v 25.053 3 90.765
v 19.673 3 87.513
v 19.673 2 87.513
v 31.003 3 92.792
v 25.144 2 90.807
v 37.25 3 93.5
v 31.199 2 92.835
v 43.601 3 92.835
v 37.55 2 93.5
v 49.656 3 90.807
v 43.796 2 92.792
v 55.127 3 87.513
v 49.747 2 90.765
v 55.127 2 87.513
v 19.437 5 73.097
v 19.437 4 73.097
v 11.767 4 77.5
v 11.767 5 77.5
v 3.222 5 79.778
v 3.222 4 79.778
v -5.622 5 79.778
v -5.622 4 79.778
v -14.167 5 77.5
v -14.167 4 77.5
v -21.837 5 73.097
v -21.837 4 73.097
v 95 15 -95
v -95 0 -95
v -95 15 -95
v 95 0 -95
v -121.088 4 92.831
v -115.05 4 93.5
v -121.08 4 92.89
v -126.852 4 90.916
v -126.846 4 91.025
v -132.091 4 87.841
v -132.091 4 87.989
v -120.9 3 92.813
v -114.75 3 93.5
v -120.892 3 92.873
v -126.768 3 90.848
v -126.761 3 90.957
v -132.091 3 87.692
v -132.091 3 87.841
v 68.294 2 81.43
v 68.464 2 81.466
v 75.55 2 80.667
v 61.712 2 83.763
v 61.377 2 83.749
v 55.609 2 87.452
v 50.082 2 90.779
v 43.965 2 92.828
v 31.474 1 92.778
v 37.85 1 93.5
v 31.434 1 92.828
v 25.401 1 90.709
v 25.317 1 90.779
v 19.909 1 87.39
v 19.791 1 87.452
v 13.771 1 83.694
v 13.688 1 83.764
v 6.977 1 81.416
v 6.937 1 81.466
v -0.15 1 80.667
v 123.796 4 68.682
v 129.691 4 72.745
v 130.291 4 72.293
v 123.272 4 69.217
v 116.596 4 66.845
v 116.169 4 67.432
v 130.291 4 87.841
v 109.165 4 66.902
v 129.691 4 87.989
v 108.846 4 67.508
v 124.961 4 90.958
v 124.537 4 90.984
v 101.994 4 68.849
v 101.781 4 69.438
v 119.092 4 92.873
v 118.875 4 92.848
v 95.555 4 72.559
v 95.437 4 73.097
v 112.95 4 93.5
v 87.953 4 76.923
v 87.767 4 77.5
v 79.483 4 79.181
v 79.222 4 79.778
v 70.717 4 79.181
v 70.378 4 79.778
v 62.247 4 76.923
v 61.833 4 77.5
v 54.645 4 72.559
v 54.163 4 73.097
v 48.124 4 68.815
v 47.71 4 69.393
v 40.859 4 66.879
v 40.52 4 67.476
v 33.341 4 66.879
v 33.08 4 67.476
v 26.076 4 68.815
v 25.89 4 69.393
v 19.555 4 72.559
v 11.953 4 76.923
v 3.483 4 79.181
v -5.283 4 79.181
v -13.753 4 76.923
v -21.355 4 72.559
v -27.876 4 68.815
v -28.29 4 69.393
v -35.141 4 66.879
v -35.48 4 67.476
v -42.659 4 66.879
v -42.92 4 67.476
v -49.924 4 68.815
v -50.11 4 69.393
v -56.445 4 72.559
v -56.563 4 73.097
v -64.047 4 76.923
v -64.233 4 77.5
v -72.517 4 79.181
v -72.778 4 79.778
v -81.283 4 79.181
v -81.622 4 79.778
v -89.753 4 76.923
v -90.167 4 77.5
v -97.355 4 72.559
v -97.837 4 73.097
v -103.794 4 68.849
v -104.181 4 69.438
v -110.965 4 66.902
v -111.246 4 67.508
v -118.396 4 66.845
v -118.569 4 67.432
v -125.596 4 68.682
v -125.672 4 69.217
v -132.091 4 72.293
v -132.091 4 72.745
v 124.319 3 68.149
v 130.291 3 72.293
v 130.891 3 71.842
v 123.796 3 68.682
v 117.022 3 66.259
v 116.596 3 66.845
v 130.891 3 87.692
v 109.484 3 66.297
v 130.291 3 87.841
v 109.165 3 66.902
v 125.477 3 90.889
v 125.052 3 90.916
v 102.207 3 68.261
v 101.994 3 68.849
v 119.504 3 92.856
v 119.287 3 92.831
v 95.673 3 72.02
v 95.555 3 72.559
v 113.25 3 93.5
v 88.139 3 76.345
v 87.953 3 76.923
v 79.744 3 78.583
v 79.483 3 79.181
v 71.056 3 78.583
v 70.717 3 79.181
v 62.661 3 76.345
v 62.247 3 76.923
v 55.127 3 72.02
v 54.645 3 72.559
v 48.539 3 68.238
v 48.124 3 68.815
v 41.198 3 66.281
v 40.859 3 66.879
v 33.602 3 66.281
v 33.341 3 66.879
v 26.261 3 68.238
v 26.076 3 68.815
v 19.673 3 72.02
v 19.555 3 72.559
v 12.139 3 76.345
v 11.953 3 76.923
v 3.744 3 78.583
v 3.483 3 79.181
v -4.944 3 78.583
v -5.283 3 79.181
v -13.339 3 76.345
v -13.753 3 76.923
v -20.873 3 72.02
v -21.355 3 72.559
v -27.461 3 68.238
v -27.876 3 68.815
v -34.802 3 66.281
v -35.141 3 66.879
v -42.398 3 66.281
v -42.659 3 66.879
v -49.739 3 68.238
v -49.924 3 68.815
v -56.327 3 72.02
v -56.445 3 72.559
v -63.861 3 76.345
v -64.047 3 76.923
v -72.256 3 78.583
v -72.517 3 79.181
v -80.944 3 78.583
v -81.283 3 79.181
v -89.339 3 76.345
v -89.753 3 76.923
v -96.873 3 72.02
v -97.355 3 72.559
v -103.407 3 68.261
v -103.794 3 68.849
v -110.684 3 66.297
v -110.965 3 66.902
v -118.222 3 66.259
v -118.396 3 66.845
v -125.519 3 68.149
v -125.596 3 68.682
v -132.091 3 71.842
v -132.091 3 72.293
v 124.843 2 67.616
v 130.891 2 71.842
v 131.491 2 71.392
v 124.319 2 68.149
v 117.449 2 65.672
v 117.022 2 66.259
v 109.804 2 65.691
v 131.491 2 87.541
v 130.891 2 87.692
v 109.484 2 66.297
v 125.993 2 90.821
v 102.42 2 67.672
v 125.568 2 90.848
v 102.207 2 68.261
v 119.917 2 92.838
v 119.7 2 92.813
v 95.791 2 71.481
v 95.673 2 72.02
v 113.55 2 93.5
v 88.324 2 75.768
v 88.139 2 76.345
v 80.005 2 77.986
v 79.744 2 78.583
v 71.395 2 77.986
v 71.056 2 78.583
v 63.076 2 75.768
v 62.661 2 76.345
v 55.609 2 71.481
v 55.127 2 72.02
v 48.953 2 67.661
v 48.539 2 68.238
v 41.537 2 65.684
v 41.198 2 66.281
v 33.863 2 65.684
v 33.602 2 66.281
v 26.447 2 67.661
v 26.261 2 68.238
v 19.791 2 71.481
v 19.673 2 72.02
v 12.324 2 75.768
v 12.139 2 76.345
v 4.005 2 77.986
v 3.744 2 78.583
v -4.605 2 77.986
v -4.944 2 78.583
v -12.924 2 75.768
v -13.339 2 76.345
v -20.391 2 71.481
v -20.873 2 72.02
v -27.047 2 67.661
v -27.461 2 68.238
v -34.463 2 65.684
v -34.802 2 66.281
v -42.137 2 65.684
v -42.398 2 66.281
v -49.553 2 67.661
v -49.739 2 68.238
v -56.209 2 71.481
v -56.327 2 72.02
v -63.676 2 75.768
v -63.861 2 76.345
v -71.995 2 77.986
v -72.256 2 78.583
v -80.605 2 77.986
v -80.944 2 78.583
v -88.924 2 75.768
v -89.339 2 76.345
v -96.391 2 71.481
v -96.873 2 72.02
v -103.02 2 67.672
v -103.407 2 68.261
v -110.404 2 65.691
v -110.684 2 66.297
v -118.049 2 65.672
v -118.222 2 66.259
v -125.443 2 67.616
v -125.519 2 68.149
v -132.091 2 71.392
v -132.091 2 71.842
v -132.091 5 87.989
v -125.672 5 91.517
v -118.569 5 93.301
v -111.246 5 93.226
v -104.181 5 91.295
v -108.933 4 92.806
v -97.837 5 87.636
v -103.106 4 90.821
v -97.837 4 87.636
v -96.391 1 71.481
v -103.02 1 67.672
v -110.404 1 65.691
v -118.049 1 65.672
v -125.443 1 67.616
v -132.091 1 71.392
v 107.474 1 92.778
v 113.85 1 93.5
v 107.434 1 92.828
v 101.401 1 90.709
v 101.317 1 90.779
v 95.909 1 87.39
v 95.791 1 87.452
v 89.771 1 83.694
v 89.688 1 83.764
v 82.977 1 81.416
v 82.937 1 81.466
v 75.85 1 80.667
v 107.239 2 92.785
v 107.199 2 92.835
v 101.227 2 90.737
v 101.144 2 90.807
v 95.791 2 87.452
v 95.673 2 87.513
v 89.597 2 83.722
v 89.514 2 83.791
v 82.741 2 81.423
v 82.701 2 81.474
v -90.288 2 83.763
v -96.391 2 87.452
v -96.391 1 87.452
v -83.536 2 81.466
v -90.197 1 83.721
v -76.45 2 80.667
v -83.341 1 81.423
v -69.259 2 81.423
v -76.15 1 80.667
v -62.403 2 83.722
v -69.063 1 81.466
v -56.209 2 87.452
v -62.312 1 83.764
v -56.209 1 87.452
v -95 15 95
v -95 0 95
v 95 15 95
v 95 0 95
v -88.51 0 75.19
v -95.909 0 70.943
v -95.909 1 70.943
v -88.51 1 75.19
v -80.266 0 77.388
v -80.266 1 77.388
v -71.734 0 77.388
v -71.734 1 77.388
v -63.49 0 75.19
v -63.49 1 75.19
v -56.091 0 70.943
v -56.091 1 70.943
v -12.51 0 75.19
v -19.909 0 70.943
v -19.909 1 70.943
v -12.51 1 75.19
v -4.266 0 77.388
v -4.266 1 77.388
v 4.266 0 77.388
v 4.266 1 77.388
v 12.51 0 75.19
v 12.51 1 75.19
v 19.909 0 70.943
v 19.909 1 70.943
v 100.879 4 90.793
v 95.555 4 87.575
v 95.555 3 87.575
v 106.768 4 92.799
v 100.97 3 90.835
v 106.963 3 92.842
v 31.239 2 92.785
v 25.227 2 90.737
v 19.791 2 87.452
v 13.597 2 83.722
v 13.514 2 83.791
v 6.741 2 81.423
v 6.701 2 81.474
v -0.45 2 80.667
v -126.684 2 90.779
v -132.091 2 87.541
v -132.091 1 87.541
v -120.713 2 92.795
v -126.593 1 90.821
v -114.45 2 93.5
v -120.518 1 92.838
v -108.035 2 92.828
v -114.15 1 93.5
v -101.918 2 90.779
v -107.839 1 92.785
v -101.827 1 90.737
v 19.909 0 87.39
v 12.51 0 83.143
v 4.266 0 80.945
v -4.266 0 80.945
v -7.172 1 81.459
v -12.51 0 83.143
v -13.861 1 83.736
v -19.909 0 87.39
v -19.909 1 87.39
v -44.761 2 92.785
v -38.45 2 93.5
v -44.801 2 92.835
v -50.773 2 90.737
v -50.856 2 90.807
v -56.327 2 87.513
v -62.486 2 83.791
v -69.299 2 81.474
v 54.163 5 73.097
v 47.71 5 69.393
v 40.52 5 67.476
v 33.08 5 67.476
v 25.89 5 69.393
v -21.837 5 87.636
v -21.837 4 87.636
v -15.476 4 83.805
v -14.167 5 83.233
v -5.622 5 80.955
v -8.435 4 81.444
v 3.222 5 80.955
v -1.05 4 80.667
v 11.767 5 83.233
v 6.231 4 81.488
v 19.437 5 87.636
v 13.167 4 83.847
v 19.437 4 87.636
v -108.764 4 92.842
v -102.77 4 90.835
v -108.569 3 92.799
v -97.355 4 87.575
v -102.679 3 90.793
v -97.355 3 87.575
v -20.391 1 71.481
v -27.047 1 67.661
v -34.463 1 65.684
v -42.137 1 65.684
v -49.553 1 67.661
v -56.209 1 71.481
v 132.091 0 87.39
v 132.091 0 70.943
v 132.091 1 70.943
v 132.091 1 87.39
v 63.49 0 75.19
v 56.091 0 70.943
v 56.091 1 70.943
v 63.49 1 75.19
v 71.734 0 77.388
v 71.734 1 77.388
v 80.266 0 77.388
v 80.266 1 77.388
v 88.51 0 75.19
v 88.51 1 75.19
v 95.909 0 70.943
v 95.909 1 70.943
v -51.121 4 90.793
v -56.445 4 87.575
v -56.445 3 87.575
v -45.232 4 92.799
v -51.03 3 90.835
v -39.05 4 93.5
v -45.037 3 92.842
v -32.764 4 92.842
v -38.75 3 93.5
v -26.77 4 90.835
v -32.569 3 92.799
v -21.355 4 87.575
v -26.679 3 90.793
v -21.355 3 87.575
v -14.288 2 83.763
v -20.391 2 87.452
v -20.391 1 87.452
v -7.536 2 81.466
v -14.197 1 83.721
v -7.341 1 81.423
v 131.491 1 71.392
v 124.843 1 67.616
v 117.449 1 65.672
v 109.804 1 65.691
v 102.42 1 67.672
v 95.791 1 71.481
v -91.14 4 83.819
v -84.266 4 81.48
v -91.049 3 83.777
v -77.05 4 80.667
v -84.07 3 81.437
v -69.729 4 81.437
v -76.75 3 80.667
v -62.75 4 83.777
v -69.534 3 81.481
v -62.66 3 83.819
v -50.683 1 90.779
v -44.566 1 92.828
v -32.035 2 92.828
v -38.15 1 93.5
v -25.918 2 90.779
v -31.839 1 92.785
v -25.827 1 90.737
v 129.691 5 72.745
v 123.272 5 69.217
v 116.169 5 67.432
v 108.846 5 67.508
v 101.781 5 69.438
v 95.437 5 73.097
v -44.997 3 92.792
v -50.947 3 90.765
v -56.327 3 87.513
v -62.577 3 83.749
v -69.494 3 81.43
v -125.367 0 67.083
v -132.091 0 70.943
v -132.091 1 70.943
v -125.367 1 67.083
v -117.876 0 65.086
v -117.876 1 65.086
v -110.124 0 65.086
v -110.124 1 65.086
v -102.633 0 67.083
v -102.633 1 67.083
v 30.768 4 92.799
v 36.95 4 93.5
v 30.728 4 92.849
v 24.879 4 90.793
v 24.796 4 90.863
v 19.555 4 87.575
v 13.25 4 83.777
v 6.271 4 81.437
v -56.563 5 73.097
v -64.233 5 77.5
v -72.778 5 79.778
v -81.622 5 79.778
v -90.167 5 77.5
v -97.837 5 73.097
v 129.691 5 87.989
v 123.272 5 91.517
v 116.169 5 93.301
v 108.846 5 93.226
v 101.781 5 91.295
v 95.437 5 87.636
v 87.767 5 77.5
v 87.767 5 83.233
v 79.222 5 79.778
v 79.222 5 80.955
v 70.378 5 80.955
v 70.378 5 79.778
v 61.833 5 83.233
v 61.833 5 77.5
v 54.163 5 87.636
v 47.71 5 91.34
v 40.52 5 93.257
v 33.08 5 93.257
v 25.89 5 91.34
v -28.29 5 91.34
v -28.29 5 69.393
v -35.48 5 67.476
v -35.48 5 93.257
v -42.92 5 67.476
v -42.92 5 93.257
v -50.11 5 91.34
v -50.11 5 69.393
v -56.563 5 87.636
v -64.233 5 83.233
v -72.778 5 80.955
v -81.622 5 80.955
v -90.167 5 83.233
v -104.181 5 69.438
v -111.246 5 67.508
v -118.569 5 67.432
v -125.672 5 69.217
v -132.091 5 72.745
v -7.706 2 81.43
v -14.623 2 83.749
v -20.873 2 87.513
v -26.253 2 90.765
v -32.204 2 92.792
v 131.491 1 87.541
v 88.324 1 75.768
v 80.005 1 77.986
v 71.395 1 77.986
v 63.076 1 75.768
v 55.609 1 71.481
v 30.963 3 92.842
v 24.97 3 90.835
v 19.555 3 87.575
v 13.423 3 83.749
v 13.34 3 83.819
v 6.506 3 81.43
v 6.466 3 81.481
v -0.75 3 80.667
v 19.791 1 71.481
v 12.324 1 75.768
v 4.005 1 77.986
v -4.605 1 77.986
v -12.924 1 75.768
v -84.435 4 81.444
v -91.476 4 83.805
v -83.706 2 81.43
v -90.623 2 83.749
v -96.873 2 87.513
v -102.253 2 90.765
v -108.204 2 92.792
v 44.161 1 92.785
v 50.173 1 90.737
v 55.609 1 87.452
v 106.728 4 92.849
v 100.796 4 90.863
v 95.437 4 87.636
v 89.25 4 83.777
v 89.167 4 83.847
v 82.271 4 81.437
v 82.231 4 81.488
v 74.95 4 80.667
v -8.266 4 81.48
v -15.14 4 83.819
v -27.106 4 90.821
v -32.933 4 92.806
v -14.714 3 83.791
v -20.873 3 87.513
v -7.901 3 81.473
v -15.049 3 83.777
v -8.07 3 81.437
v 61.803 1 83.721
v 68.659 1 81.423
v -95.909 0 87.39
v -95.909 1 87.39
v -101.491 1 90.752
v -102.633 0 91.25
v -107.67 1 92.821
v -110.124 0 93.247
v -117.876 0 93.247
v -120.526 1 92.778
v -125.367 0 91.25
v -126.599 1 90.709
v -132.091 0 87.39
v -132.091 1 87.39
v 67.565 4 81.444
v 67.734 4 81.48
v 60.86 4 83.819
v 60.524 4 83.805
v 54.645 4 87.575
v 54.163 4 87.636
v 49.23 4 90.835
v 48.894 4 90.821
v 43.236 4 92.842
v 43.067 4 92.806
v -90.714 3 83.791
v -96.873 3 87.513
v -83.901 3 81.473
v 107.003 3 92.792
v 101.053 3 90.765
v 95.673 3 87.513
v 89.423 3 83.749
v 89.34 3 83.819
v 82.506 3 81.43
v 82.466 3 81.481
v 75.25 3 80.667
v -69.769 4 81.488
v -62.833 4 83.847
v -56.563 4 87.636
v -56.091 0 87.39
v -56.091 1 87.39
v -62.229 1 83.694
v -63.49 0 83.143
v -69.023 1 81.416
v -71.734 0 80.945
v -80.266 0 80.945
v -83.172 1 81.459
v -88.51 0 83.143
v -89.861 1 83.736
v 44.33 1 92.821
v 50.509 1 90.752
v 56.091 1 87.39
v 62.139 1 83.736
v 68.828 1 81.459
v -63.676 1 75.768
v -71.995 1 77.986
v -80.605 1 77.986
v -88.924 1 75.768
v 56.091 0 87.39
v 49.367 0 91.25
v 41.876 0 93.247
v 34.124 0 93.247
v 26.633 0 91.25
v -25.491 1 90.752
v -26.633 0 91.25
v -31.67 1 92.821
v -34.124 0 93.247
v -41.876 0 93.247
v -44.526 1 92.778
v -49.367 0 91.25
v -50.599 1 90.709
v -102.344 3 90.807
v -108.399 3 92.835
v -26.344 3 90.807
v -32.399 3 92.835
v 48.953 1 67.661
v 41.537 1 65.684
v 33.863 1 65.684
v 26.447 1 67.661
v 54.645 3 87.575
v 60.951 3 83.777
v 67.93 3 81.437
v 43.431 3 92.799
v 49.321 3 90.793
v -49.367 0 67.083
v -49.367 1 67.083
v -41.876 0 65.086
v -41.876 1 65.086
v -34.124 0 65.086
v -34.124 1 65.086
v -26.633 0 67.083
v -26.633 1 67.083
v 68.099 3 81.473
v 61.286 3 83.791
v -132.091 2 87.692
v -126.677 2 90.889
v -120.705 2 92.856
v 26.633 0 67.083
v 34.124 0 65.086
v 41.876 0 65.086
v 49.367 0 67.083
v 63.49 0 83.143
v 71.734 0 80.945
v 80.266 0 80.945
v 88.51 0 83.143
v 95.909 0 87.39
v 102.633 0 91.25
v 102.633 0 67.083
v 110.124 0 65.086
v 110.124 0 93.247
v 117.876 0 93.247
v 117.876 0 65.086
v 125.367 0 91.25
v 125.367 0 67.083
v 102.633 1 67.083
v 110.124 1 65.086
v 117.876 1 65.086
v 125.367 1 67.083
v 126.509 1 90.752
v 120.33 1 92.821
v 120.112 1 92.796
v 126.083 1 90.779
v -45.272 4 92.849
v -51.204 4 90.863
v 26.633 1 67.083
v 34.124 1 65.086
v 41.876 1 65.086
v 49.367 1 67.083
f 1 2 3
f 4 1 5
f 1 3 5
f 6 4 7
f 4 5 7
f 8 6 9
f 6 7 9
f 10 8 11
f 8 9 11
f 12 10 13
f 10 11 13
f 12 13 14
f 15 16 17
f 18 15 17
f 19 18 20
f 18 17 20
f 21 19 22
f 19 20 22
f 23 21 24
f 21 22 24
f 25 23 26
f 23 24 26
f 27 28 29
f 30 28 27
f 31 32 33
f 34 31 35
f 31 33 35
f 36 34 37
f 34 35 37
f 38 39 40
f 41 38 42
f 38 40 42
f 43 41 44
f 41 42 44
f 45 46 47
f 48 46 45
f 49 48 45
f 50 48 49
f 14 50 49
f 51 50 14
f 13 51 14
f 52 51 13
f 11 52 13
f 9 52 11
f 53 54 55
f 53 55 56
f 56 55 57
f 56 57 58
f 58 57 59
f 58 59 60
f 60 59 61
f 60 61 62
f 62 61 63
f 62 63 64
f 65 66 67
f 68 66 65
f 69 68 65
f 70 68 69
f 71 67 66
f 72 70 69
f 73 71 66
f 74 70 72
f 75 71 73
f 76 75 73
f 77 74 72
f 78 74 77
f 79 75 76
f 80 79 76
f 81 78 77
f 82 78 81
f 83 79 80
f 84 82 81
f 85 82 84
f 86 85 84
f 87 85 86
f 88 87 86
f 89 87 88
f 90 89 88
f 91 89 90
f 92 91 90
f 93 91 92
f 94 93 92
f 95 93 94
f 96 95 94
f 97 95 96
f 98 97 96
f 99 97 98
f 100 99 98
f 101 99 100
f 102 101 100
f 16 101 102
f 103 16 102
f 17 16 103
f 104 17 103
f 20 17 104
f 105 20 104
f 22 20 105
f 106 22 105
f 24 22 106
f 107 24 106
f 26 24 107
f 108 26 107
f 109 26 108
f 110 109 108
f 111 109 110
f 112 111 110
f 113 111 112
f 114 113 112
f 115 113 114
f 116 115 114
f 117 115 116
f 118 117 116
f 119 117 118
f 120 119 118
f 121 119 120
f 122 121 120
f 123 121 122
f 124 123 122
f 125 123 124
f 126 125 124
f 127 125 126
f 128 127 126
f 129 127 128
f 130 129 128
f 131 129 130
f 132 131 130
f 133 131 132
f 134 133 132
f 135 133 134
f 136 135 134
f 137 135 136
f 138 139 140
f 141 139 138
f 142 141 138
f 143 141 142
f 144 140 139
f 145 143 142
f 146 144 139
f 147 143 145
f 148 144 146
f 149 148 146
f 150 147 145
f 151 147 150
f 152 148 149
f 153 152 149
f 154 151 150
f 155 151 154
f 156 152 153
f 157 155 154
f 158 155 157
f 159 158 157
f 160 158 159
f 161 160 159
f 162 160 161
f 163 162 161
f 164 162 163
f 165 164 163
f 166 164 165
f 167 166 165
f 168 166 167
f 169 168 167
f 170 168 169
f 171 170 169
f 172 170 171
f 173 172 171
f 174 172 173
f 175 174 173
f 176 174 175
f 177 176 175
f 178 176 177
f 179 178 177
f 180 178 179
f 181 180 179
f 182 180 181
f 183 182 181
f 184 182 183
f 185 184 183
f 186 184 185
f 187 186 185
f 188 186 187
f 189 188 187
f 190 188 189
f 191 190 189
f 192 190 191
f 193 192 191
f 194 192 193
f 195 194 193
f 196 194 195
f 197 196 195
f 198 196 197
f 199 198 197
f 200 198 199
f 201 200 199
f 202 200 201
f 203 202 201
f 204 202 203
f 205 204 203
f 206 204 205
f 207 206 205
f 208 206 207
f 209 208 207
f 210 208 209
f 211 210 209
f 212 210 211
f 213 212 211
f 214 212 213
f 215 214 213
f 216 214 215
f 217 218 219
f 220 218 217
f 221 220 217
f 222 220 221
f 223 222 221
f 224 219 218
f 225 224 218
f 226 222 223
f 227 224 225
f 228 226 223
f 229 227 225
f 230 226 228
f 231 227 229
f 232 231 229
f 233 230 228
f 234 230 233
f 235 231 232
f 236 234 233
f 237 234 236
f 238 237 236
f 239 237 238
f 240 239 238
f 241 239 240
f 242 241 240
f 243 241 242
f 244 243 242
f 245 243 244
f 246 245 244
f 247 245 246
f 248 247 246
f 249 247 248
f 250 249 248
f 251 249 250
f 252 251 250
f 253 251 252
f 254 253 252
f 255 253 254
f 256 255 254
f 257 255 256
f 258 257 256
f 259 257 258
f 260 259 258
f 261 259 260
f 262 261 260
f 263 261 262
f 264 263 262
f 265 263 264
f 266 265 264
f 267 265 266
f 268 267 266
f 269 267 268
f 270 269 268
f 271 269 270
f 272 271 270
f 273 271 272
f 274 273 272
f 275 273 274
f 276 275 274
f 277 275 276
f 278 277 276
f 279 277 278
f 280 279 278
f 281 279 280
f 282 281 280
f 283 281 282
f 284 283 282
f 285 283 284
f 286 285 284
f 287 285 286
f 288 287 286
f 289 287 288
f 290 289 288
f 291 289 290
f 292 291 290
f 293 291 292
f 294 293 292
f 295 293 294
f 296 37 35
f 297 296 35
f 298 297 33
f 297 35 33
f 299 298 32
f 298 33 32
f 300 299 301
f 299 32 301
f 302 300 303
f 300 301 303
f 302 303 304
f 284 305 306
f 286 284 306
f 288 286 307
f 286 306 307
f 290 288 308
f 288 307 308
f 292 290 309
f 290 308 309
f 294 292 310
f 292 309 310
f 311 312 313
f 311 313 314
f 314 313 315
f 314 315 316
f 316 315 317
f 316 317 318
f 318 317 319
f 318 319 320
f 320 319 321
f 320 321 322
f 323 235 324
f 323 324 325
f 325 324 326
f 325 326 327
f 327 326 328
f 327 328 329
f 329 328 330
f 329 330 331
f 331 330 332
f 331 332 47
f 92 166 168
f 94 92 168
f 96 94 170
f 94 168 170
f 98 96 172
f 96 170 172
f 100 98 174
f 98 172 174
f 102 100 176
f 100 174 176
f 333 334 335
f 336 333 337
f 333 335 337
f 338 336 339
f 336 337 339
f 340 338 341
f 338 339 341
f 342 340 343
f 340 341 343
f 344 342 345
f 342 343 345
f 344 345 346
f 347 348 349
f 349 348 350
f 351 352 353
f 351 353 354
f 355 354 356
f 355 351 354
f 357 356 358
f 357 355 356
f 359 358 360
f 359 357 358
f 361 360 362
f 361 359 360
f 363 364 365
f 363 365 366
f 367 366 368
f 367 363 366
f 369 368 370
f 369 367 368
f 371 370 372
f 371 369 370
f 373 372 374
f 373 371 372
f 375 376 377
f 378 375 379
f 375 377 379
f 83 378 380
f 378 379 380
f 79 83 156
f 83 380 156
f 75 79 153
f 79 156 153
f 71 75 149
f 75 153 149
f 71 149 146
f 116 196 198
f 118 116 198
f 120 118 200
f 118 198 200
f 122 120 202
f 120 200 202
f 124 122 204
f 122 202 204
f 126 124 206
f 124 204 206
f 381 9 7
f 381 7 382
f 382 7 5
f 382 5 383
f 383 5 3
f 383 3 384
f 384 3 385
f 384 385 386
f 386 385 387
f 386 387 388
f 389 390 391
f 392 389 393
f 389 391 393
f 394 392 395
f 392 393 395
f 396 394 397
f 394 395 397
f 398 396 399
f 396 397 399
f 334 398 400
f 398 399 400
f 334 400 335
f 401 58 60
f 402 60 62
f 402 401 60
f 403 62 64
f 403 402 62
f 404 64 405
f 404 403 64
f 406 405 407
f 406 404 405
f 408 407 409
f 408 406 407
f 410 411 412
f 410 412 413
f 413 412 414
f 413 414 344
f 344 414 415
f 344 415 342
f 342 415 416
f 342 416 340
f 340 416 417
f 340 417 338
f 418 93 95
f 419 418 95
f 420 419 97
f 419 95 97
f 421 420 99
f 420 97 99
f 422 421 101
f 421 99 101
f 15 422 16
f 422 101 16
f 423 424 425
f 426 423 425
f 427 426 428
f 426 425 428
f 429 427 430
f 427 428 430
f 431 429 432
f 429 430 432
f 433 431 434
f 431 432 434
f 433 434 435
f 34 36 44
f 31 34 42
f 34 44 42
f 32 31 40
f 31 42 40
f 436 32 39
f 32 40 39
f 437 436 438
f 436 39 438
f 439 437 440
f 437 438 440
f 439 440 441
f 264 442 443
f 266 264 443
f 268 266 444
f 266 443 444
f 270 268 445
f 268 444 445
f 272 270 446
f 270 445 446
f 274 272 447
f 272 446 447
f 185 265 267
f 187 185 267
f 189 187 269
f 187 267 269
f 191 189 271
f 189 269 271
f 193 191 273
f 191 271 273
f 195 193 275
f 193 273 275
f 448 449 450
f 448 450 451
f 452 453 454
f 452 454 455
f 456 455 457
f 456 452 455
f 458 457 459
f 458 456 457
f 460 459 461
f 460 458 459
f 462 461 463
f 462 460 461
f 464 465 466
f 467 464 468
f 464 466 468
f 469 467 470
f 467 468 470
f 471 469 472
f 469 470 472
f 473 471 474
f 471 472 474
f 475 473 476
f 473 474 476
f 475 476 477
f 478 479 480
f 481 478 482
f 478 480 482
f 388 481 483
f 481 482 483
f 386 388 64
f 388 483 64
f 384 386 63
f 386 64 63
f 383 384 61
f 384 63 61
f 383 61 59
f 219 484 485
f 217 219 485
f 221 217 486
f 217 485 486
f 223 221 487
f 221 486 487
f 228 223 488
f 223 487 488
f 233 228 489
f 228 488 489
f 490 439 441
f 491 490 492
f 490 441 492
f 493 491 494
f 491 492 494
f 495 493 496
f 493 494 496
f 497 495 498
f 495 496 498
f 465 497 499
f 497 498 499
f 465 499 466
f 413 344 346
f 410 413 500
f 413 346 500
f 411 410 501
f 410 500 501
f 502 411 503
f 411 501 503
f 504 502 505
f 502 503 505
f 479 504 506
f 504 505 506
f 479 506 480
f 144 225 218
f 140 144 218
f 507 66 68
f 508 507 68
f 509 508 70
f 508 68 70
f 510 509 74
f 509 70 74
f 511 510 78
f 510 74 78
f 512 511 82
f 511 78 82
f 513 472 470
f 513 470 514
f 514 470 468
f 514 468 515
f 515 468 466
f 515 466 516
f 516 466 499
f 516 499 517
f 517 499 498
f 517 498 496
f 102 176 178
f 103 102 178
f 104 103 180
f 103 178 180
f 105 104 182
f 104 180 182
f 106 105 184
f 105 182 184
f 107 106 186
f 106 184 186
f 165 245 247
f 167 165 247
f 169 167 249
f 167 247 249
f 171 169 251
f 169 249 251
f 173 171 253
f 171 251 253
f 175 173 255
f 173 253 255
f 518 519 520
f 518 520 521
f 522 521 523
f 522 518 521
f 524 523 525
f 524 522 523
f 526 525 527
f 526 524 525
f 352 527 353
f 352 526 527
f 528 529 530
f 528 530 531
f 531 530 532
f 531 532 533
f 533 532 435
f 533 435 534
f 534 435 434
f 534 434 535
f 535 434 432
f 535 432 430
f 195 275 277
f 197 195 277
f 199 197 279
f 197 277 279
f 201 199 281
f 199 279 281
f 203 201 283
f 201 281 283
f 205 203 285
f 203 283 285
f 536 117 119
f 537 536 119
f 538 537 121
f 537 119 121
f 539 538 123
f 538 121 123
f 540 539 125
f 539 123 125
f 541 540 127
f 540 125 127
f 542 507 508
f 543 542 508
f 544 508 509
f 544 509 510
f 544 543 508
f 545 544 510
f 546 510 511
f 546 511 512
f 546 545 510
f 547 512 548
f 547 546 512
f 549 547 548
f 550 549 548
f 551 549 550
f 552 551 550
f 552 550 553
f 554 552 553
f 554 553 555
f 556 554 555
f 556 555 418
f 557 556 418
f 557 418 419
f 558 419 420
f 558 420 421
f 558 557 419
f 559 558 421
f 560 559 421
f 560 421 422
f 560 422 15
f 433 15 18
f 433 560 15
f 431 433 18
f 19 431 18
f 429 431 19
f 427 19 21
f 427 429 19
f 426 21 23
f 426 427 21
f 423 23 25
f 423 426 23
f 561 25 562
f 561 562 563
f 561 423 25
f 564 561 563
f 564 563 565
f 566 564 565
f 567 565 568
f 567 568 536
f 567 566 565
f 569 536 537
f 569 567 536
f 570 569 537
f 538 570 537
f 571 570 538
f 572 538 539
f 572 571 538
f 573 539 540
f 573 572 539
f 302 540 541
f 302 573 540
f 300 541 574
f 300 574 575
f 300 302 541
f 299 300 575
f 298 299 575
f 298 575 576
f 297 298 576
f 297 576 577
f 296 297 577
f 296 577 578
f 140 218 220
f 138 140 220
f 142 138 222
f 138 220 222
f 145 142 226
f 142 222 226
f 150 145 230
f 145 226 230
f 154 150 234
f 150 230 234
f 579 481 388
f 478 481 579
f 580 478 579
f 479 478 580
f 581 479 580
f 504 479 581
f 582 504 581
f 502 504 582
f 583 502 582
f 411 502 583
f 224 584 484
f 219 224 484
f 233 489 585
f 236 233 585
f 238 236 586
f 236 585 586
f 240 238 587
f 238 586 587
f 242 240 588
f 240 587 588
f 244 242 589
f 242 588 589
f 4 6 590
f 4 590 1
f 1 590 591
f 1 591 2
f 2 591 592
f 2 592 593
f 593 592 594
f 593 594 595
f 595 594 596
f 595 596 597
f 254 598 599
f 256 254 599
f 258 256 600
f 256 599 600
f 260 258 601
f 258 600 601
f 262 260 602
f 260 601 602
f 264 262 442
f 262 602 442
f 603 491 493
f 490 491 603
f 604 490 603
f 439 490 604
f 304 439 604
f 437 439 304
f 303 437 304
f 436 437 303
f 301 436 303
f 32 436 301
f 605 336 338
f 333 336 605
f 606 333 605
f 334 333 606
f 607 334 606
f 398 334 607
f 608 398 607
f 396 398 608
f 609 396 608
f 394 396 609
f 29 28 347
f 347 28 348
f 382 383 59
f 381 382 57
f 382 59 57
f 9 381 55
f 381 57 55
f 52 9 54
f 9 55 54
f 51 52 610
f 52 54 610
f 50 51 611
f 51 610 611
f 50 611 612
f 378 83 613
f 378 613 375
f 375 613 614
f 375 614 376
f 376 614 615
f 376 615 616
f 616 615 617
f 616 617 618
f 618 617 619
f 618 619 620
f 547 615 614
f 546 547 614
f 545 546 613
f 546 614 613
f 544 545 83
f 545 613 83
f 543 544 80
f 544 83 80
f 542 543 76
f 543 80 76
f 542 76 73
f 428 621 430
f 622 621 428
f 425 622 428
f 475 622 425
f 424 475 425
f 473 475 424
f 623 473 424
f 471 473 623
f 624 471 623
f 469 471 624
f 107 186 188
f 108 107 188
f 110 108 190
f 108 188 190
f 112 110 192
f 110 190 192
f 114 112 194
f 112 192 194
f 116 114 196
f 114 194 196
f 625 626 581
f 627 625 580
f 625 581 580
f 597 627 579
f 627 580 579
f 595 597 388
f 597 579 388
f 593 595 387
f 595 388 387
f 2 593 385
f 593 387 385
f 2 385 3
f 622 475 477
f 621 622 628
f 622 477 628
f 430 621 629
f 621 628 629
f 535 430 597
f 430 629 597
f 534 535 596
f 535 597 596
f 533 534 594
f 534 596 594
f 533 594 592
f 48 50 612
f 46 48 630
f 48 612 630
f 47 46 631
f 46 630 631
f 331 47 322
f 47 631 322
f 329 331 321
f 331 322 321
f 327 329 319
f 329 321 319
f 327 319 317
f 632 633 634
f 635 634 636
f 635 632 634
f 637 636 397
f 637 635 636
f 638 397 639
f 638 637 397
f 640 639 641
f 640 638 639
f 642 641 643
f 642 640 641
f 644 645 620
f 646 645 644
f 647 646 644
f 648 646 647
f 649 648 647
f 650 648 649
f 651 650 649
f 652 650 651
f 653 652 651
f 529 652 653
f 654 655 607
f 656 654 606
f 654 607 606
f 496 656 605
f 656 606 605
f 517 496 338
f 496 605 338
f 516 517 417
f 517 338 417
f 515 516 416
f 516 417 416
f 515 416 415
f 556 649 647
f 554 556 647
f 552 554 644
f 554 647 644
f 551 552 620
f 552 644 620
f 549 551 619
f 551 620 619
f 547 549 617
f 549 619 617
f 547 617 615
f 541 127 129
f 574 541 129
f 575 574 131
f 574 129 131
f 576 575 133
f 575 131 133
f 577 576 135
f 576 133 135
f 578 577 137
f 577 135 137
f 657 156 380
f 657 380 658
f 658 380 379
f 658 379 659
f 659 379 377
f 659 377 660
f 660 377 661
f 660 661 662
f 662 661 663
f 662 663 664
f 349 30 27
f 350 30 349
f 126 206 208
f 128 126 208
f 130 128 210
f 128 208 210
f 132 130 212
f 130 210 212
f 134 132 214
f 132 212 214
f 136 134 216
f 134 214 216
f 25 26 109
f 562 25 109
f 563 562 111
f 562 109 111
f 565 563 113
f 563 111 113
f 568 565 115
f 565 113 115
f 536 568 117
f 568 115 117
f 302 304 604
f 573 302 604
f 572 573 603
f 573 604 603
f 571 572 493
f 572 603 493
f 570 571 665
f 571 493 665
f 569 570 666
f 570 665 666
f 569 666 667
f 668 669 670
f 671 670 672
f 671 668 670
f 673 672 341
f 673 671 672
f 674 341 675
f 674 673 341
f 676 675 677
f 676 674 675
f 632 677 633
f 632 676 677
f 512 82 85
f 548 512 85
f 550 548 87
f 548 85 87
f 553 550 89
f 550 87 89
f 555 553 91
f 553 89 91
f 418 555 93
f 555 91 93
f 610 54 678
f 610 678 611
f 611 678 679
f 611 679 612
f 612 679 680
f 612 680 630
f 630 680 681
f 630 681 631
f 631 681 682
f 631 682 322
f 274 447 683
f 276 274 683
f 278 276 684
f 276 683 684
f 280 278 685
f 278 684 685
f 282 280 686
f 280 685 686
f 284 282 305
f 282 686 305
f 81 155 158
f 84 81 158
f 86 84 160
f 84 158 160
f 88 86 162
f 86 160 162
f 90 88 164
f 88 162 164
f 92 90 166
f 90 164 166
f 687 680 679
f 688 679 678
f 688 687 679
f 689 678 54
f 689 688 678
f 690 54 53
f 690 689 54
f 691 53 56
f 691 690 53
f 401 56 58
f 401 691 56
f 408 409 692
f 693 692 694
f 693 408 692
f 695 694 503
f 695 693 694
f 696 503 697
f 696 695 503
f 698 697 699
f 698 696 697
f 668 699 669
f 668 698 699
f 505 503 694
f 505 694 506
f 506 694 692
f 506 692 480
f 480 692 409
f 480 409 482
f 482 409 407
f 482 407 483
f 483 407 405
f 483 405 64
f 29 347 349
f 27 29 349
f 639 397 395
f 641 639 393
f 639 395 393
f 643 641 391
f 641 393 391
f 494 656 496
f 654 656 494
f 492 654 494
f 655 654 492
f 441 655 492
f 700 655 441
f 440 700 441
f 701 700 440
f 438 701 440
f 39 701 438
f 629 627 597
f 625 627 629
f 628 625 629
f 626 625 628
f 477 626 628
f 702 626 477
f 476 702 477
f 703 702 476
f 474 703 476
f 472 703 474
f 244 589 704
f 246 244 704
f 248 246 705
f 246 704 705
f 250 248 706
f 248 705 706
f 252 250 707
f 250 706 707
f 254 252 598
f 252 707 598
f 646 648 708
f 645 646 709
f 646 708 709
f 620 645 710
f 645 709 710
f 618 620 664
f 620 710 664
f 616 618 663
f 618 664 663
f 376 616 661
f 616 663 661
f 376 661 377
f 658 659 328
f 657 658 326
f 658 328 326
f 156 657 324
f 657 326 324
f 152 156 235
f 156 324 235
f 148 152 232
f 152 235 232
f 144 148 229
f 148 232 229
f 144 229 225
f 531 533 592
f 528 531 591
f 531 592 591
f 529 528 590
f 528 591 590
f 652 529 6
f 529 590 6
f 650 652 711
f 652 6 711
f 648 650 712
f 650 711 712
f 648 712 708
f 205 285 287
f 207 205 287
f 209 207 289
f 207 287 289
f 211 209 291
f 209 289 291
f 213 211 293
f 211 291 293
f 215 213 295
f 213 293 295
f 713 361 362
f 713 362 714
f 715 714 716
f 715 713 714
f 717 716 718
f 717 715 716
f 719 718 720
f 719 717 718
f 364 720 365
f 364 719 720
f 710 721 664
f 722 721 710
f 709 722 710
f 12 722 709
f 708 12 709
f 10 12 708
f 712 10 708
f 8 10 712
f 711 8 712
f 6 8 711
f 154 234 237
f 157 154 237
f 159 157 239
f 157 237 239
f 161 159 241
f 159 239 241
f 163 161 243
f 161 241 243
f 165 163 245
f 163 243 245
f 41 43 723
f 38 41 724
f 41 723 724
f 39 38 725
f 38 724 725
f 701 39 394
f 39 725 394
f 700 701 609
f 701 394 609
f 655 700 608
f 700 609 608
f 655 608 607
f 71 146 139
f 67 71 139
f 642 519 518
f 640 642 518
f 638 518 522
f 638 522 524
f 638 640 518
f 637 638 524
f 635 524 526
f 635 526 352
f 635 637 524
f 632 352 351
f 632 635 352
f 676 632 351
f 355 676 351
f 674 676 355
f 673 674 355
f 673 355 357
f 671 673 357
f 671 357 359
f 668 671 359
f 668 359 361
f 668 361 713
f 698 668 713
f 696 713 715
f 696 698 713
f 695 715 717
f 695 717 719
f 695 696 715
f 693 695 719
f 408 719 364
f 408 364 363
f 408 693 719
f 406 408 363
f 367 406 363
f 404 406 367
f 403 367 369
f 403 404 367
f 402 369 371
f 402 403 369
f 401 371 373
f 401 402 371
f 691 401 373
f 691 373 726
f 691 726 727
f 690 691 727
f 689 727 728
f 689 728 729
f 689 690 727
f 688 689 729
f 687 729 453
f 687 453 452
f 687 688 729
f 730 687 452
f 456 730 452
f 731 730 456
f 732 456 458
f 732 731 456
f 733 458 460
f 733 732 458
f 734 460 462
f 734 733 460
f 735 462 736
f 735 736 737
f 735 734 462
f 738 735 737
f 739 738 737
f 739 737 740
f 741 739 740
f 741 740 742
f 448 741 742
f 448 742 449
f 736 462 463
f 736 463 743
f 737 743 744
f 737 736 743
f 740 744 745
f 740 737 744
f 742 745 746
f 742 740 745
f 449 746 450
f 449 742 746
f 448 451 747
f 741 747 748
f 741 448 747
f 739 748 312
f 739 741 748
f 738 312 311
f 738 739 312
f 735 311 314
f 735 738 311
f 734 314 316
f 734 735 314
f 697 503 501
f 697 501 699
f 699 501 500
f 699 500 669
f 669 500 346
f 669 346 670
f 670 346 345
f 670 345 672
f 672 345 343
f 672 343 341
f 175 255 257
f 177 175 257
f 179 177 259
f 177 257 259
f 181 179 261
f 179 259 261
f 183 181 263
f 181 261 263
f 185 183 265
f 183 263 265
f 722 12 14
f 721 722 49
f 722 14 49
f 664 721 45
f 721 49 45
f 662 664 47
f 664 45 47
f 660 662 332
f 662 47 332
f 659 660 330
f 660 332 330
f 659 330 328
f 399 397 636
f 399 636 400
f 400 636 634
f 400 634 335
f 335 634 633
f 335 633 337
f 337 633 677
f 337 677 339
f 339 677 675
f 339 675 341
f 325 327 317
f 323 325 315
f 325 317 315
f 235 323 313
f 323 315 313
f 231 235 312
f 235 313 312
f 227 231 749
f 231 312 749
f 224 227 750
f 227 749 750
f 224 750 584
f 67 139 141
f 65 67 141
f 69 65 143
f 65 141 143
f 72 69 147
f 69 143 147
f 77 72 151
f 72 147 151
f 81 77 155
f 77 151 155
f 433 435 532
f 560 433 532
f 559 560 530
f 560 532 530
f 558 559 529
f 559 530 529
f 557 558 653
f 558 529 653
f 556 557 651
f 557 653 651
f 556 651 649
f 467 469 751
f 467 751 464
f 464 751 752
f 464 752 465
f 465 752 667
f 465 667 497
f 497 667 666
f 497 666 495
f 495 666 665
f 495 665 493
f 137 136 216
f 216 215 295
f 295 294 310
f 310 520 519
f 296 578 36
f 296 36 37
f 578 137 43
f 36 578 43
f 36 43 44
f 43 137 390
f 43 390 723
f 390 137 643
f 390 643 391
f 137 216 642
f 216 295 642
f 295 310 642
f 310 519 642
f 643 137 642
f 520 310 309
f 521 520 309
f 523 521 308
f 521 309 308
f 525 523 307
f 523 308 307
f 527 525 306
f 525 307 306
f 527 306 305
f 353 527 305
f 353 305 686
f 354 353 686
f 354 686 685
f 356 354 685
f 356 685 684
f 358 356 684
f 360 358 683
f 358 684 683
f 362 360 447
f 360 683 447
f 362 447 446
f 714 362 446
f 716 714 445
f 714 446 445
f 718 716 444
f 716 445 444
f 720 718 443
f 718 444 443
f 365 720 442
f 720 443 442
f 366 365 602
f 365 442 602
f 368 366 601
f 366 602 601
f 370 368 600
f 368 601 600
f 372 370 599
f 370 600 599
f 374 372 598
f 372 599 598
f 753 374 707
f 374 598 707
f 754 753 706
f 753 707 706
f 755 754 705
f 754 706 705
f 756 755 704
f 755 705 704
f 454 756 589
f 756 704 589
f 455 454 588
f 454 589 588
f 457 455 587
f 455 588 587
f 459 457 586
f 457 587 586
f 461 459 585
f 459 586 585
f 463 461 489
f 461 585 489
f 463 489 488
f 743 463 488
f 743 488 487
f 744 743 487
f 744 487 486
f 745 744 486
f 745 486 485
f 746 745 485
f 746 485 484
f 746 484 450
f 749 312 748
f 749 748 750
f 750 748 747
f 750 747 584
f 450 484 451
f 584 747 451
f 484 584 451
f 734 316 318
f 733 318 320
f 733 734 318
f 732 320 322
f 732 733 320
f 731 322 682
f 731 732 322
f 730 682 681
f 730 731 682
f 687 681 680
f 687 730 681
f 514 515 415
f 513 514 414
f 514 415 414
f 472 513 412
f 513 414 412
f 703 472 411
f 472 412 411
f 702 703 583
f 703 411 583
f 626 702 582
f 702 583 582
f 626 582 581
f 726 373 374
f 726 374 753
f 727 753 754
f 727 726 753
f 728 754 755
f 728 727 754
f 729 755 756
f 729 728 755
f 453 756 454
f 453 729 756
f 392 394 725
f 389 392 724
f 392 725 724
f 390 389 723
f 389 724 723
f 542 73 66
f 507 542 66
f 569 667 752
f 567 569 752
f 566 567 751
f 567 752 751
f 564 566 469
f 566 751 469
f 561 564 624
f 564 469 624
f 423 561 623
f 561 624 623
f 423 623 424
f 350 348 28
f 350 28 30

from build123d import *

# Parameters (mm, degrees)
F0_W      = 190
F0_H      = 190
F1_DEPTH  = 15
F3_DEPTH  = 1
F5_DEPTH  = 1
F7_DEPTH  = 1
F9_DEPTH  = 1
F11_DEPTH = 1


with BuildPart() as f1:
    # F0 (on Front) → F1 (new body)
    with BuildSketch(Plane.XZ):
        Rectangle(F0_W, F0_H)
    extrude(amount=-F1_DEPTH)


with BuildPart() as f3:
    # F2 (on face) → F3 (new body)
    with BuildSketch(Plane.XZ):
        with BuildLine():
            ThreePointArc((-56.0905668848, 87.3904664468), (-76, 80.6666666667), (-95.9094331152, 87.3904664468))
            ThreePointArc((-95.9094331152, 87.3904664468), (-114, 93.5), (-132.0905668848, 87.3904664468))
            Line((-132.0905668848, 87.3904664468), (-132.0905668848, 70.9428668865))
            ThreePointArc((-132.0905668848, 70.9428668865), (-114, 64.8333333333), (-95.9094331152, 70.9428668865))
            ThreePointArc((-95.9094331152, 70.9428668865), (-76, 77.6666666667), (-56.0905668848, 70.9428668865))
            ThreePointArc((-56.0905668848, 70.9428668865), (-38, 64.8333333333), (-19.9094331152, 70.9428668865))
            ThreePointArc((-19.9094331152, 70.9428668865), (0, 77.6666666667), (19.9094331152, 70.9428668865))
            ThreePointArc((19.9094331152, 70.9428668865), (38, 64.8333333333), (56.0905668848, 70.9428668865))
            ThreePointArc((56.0905668848, 70.9428668865), (76, 77.6666666667), (95.9094331152, 70.9428668865))
            ThreePointArc((95.9094331152, 70.9428668865), (114, 64.8333333333), (132.0905668848, 70.9428668865))
            Line((132.0905668848, 70.9428668865), (132.0905668848, 87.3904664468))
            ThreePointArc((132.0905668848, 87.3904664468), (114, 93.5), (95.9094331152, 87.3904664468))
            ThreePointArc((95.9094331152, 87.3904664468), (76, 80.6666666667), (56.0905668848, 87.3904664468))
            ThreePointArc((56.0905668848, 87.3904664468), (38, 93.5), (19.9094331152, 87.3904664468))
            ThreePointArc((19.9094331152, 87.3904664468), (0, 80.6666666667), (-19.9094331152, 87.3904664468))
            ThreePointArc((-19.9094331152, 87.3904664468), (-38, 93.5), (-56.0905668848, 87.3904664468))
        make_face()
    extrude(amount=-F3_DEPTH)

    # F4 (on face) → F5 (join)
    with BuildSketch(Plane(origin=(0, 1, 0), x_dir=(-1, 0, 0), z_dir=(0, 1, 0))):
        with BuildLine():
            ThreePointArc((-95.7913197263, 87.4518930814), (-113.6258792589, 93.4999070156), (-131.4905668729, 87.541474107))
            Line((-131.4905668729, 87.541474107), (-131.4905668729, 71.3918592502))
            ThreePointArc((-131.4905668729, 71.3918592502), (-113.6258792589, 65.4334263416), (-95.7913197263, 71.4814402758))
            ThreePointArc((-95.7913197263, 71.4814402758), (-75.6999999881, 78.2666666786), (-55.6086802499, 71.4814402758))
            ThreePointArc((-55.6086802499, 71.4814402758), (-37.6999999881, 65.4333333453), (-19.7913197263, 71.4814402758))
            ThreePointArc((-19.7913197263, 71.4814402758), (0.3000000119, 78.2666666786), (20.3913197501, 71.4814402758))
            ThreePointArc((20.3913197501, 71.4814402758), (38.3000000119, 65.4333333453), (56.2086802737, 71.4814402758))
            ThreePointArc((56.2086802737, 71.4814402758), (76.3000000119, 78.2666666786), (96.3913197501, 71.4814402758))
            ThreePointArc((96.3913197501, 71.4814402758), (114.2258792828, 65.4334263416), (132.0905668967, 71.3918592502))
            Line((132.0905668967, 71.3918592502), (132.0905668967, 87.541474107))
            ThreePointArc((132.0905668967, 87.541474107), (114.2258792828, 93.4999070156), (96.3913197501, 87.4518930814))
            ThreePointArc((96.3913197501, 87.4518930814), (76.3000000119, 80.6666666786), (56.2086802737, 87.4518930814))
            ThreePointArc((56.2086802737, 87.4518930814), (38.3000000119, 93.5000000119), (20.3913197501, 87.4518930814))
            ThreePointArc((20.3913197501, 87.4518930814), (0.3000000119, 80.6666666786), (-19.7913197263, 87.4518930814))
            ThreePointArc((-19.7913197263, 87.4518930814), (-37.6999999881, 93.5000000119), (-55.6086802499, 87.4518930814))
            ThreePointArc((-55.6086802499, 87.4518930814), (-75.6999999881, 80.6666666786), (-95.7913197263, 87.4518930814))
        make_face()
    extrude(amount=F5_DEPTH)

    # F6 (on face) → F7 (join)
    with BuildSketch(Plane(origin=(0, 2, 0), x_dir=(-1, 0, 0), z_dir=(0, 1, 0))):
        with BuildLine():
            ThreePointArc((56.3267936626, 87.513319716), (38.6000000238, 93.5000000238), (20.8732063851, 87.513319716))
            ThreePointArc((20.8732063851, 87.513319716), (0.6000000238, 80.6666666905), (-19.6732063374, 87.513319716))
            ThreePointArc((-19.6732063374, 87.513319716), (-37.3999999762, 93.5000000238), (-55.1267936149, 87.513319716))
            ThreePointArc((-55.1267936149, 87.513319716), (-75.3999999762, 80.6666666905), (-95.6732063374, 87.513319716))
            ThreePointArc((-95.6732063374, 87.513319716), (-113.2520443013, 93.4996256674), (-130.890566861, 87.6915343271))
            Line((-130.890566861, 87.6915343271), (-130.890566861, 71.8417990539))
            ThreePointArc((-130.890566861, 71.8417990539), (-113.2520443013, 66.0337077137), (-95.6732063374, 72.020013665))
            ThreePointArc((-95.6732063374, 72.020013665), (-75.3999999762, 78.8666666905), (-55.1267936149, 72.020013665))
            ThreePointArc((-55.1267936149, 72.020013665), (-37.3999999762, 66.0333333572), (-19.6732063374, 72.020013665))
            ThreePointArc((-19.6732063374, 72.020013665), (0.6000000238, 78.8666666905), (20.8732063851, 72.020013665))
            ThreePointArc((20.8732063851, 72.020013665), (38.6000000238, 66.0333333572), (56.3267936626, 72.020013665))
            ThreePointArc((56.3267936626, 72.020013665), (76.6000000238, 78.8666666905), (96.8732063851, 72.020013665))
            ThreePointArc((96.8732063851, 72.020013665), (114.452044349, 66.0337077137), (132.0905669087, 71.8417990539))
            Line((132.0905669087, 71.8417990539), (132.0905669087, 87.6915343271))
            ThreePointArc((132.0905669087, 87.6915343271), (114.452044349, 93.4996256674), (96.8732063851, 87.513319716))
            ThreePointArc((96.8732063851, 87.513319716), (76.6000000238, 80.6666666905), (56.3267936626, 87.513319716))
        make_face()
    extrude(amount=F7_DEPTH)

    # F8 (on face) → F9 (join)
    with BuildSketch(Plane(origin=(0, 3, 0), x_dir=(-1, 0, 0), z_dir=(0, 1, 0))):
        with BuildLine():
            ThreePointArc((56.4449070515, 87.5747463506), (38.9000000358, 93.5000000358), (21.3550930201, 87.5747463506))
            ThreePointArc((21.3550930201, 87.5747463506), (0.9000000358, 80.6666667024), (-19.5550929485, 87.5747463506))
            ThreePointArc((-19.5550929485, 87.5747463506), (-37.0999999642, 93.5000000358), (-54.6449069799, 87.5747463506))
            ThreePointArc((-54.6449069799, 87.5747463506), (-75.0999999642, 80.6666667024), (-95.5550929485, 87.5747463506))
            ThreePointArc((-95.5550929485, 87.5747463506), (-112.8784991713, 93.49915231), (-130.290566849, 87.8406287996))
            Line((-130.290566849, 87.8406287996), (-130.290566849, 72.2927046052))
            ThreePointArc((-130.290566849, 72.2927046052), (-112.8784991713, 66.6341810948), (-95.5550929485, 72.5585870542))
            ThreePointArc((-95.5550929485, 72.5585870542), (-75.0999999642, 79.4666667024), (-54.6449069799, 72.5585870542))
            ThreePointArc((-54.6449069799, 72.5585870542), (-37.0999999642, 66.6333333691), (-19.5550929485, 72.5585870542))
            ThreePointArc((-19.5550929485, 72.5585870542), (0.9000000358, 79.4666667024), (21.3550930201, 72.5585870542))
            ThreePointArc((21.3550930201, 72.5585870542), (38.9000000358, 66.6333333691), (56.4449070515, 72.5585870542))
            ThreePointArc((56.4449070515, 72.5585870542), (76.9000000358, 79.4666667024), (97.3550930201, 72.5585870542))
            ThreePointArc((97.3550930201, 72.5585870542), (114.6784992428, 66.6341810948), (132.0905669206, 72.2927046052))
            Line((132.0905669206, 72.2927046052), (132.0905669206, 87.8406287996))
            ThreePointArc((132.0905669206, 87.8406287996), (114.6784992428, 93.49915231), (97.3550930201, 87.5747463506))
            ThreePointArc((97.3550930201, 87.5747463506), (76.9000000358, 80.6666667024), (56.4449070515, 87.5747463506))
        make_face()
    extrude(amount=F9_DEPTH)

    # F10 (on face) → F11 (join)
    with BuildSketch(Plane(origin=(0, 4, 0), x_dir=(-1, 0, 0), z_dir=(0, 1, 0))):
        with BuildLine():
            ThreePointArc((-19.4369795597, 87.6361729853), (-36.7999999523, 93.5000000477), (-54.163020345, 87.6361729853))
            ThreePointArc((-54.163020345, 87.6361729853), (-74.7999999523, 80.6666667144), (-95.4369795597, 87.6361729853))
            ThreePointArc((-95.4369795597, 87.6361729853), (-112.5052480041, 93.4984831751), (-129.6905668371, 87.9887386199))
            Line((-129.6905668371, 87.9887386199), (-129.6905668371, 72.7445948088))
            ThreePointArc((-129.6905668371, 72.7445948088), (-112.5052480041, 67.2348502536), (-95.4369795597, 73.0971604434))
            ThreePointArc((-95.4369795597, 73.0971604434), (-74.7999999523, 80.0666667144), (-54.163020345, 73.0971604434))
            ThreePointArc((-54.163020345, 73.0971604434), (-36.7999999523, 67.233333381), (-19.4369795597, 73.0971604434))
            ThreePointArc((-19.4369795597, 73.0971604434), (1.2000000477, 80.0666667144), (21.836979655, 73.0971604434))
            ThreePointArc((21.836979655, 73.0971604434), (39.2000000477, 67.233333381), (56.5630204403, 73.0971604434))
            ThreePointArc((56.5630204403, 73.0971604434), (77.2000000477, 80.0666667144), (97.836979655, 73.0971604434))
            ThreePointArc((97.836979655, 73.0971604434), (114.9052480995, 67.2348502536), (132.0905669325, 72.7445948088))
            Line((132.0905669325, 72.7445948088), (132.0905669325, 87.9887386199))
            ThreePointArc((132.0905669325, 87.9887386199), (114.9052480995, 93.4984831751), (97.836979655, 87.6361729853))
            ThreePointArc((97.836979655, 87.6361729853), (77.2000000477, 80.6666667144), (56.5630204403, 87.6361729853))
            ThreePointArc((56.5630204403, 87.6361729853), (39.2000000477, 93.5000000477), (21.836979655, 87.6361729853))
            ThreePointArc((21.836979655, 87.6361729853), (1.2000000477, 80.6666667144), (-19.4369795597, 87.6361729853))
        make_face()
    extrude(amount=F11_DEPTH)


solid = Compound([f1.part, f3.part])
